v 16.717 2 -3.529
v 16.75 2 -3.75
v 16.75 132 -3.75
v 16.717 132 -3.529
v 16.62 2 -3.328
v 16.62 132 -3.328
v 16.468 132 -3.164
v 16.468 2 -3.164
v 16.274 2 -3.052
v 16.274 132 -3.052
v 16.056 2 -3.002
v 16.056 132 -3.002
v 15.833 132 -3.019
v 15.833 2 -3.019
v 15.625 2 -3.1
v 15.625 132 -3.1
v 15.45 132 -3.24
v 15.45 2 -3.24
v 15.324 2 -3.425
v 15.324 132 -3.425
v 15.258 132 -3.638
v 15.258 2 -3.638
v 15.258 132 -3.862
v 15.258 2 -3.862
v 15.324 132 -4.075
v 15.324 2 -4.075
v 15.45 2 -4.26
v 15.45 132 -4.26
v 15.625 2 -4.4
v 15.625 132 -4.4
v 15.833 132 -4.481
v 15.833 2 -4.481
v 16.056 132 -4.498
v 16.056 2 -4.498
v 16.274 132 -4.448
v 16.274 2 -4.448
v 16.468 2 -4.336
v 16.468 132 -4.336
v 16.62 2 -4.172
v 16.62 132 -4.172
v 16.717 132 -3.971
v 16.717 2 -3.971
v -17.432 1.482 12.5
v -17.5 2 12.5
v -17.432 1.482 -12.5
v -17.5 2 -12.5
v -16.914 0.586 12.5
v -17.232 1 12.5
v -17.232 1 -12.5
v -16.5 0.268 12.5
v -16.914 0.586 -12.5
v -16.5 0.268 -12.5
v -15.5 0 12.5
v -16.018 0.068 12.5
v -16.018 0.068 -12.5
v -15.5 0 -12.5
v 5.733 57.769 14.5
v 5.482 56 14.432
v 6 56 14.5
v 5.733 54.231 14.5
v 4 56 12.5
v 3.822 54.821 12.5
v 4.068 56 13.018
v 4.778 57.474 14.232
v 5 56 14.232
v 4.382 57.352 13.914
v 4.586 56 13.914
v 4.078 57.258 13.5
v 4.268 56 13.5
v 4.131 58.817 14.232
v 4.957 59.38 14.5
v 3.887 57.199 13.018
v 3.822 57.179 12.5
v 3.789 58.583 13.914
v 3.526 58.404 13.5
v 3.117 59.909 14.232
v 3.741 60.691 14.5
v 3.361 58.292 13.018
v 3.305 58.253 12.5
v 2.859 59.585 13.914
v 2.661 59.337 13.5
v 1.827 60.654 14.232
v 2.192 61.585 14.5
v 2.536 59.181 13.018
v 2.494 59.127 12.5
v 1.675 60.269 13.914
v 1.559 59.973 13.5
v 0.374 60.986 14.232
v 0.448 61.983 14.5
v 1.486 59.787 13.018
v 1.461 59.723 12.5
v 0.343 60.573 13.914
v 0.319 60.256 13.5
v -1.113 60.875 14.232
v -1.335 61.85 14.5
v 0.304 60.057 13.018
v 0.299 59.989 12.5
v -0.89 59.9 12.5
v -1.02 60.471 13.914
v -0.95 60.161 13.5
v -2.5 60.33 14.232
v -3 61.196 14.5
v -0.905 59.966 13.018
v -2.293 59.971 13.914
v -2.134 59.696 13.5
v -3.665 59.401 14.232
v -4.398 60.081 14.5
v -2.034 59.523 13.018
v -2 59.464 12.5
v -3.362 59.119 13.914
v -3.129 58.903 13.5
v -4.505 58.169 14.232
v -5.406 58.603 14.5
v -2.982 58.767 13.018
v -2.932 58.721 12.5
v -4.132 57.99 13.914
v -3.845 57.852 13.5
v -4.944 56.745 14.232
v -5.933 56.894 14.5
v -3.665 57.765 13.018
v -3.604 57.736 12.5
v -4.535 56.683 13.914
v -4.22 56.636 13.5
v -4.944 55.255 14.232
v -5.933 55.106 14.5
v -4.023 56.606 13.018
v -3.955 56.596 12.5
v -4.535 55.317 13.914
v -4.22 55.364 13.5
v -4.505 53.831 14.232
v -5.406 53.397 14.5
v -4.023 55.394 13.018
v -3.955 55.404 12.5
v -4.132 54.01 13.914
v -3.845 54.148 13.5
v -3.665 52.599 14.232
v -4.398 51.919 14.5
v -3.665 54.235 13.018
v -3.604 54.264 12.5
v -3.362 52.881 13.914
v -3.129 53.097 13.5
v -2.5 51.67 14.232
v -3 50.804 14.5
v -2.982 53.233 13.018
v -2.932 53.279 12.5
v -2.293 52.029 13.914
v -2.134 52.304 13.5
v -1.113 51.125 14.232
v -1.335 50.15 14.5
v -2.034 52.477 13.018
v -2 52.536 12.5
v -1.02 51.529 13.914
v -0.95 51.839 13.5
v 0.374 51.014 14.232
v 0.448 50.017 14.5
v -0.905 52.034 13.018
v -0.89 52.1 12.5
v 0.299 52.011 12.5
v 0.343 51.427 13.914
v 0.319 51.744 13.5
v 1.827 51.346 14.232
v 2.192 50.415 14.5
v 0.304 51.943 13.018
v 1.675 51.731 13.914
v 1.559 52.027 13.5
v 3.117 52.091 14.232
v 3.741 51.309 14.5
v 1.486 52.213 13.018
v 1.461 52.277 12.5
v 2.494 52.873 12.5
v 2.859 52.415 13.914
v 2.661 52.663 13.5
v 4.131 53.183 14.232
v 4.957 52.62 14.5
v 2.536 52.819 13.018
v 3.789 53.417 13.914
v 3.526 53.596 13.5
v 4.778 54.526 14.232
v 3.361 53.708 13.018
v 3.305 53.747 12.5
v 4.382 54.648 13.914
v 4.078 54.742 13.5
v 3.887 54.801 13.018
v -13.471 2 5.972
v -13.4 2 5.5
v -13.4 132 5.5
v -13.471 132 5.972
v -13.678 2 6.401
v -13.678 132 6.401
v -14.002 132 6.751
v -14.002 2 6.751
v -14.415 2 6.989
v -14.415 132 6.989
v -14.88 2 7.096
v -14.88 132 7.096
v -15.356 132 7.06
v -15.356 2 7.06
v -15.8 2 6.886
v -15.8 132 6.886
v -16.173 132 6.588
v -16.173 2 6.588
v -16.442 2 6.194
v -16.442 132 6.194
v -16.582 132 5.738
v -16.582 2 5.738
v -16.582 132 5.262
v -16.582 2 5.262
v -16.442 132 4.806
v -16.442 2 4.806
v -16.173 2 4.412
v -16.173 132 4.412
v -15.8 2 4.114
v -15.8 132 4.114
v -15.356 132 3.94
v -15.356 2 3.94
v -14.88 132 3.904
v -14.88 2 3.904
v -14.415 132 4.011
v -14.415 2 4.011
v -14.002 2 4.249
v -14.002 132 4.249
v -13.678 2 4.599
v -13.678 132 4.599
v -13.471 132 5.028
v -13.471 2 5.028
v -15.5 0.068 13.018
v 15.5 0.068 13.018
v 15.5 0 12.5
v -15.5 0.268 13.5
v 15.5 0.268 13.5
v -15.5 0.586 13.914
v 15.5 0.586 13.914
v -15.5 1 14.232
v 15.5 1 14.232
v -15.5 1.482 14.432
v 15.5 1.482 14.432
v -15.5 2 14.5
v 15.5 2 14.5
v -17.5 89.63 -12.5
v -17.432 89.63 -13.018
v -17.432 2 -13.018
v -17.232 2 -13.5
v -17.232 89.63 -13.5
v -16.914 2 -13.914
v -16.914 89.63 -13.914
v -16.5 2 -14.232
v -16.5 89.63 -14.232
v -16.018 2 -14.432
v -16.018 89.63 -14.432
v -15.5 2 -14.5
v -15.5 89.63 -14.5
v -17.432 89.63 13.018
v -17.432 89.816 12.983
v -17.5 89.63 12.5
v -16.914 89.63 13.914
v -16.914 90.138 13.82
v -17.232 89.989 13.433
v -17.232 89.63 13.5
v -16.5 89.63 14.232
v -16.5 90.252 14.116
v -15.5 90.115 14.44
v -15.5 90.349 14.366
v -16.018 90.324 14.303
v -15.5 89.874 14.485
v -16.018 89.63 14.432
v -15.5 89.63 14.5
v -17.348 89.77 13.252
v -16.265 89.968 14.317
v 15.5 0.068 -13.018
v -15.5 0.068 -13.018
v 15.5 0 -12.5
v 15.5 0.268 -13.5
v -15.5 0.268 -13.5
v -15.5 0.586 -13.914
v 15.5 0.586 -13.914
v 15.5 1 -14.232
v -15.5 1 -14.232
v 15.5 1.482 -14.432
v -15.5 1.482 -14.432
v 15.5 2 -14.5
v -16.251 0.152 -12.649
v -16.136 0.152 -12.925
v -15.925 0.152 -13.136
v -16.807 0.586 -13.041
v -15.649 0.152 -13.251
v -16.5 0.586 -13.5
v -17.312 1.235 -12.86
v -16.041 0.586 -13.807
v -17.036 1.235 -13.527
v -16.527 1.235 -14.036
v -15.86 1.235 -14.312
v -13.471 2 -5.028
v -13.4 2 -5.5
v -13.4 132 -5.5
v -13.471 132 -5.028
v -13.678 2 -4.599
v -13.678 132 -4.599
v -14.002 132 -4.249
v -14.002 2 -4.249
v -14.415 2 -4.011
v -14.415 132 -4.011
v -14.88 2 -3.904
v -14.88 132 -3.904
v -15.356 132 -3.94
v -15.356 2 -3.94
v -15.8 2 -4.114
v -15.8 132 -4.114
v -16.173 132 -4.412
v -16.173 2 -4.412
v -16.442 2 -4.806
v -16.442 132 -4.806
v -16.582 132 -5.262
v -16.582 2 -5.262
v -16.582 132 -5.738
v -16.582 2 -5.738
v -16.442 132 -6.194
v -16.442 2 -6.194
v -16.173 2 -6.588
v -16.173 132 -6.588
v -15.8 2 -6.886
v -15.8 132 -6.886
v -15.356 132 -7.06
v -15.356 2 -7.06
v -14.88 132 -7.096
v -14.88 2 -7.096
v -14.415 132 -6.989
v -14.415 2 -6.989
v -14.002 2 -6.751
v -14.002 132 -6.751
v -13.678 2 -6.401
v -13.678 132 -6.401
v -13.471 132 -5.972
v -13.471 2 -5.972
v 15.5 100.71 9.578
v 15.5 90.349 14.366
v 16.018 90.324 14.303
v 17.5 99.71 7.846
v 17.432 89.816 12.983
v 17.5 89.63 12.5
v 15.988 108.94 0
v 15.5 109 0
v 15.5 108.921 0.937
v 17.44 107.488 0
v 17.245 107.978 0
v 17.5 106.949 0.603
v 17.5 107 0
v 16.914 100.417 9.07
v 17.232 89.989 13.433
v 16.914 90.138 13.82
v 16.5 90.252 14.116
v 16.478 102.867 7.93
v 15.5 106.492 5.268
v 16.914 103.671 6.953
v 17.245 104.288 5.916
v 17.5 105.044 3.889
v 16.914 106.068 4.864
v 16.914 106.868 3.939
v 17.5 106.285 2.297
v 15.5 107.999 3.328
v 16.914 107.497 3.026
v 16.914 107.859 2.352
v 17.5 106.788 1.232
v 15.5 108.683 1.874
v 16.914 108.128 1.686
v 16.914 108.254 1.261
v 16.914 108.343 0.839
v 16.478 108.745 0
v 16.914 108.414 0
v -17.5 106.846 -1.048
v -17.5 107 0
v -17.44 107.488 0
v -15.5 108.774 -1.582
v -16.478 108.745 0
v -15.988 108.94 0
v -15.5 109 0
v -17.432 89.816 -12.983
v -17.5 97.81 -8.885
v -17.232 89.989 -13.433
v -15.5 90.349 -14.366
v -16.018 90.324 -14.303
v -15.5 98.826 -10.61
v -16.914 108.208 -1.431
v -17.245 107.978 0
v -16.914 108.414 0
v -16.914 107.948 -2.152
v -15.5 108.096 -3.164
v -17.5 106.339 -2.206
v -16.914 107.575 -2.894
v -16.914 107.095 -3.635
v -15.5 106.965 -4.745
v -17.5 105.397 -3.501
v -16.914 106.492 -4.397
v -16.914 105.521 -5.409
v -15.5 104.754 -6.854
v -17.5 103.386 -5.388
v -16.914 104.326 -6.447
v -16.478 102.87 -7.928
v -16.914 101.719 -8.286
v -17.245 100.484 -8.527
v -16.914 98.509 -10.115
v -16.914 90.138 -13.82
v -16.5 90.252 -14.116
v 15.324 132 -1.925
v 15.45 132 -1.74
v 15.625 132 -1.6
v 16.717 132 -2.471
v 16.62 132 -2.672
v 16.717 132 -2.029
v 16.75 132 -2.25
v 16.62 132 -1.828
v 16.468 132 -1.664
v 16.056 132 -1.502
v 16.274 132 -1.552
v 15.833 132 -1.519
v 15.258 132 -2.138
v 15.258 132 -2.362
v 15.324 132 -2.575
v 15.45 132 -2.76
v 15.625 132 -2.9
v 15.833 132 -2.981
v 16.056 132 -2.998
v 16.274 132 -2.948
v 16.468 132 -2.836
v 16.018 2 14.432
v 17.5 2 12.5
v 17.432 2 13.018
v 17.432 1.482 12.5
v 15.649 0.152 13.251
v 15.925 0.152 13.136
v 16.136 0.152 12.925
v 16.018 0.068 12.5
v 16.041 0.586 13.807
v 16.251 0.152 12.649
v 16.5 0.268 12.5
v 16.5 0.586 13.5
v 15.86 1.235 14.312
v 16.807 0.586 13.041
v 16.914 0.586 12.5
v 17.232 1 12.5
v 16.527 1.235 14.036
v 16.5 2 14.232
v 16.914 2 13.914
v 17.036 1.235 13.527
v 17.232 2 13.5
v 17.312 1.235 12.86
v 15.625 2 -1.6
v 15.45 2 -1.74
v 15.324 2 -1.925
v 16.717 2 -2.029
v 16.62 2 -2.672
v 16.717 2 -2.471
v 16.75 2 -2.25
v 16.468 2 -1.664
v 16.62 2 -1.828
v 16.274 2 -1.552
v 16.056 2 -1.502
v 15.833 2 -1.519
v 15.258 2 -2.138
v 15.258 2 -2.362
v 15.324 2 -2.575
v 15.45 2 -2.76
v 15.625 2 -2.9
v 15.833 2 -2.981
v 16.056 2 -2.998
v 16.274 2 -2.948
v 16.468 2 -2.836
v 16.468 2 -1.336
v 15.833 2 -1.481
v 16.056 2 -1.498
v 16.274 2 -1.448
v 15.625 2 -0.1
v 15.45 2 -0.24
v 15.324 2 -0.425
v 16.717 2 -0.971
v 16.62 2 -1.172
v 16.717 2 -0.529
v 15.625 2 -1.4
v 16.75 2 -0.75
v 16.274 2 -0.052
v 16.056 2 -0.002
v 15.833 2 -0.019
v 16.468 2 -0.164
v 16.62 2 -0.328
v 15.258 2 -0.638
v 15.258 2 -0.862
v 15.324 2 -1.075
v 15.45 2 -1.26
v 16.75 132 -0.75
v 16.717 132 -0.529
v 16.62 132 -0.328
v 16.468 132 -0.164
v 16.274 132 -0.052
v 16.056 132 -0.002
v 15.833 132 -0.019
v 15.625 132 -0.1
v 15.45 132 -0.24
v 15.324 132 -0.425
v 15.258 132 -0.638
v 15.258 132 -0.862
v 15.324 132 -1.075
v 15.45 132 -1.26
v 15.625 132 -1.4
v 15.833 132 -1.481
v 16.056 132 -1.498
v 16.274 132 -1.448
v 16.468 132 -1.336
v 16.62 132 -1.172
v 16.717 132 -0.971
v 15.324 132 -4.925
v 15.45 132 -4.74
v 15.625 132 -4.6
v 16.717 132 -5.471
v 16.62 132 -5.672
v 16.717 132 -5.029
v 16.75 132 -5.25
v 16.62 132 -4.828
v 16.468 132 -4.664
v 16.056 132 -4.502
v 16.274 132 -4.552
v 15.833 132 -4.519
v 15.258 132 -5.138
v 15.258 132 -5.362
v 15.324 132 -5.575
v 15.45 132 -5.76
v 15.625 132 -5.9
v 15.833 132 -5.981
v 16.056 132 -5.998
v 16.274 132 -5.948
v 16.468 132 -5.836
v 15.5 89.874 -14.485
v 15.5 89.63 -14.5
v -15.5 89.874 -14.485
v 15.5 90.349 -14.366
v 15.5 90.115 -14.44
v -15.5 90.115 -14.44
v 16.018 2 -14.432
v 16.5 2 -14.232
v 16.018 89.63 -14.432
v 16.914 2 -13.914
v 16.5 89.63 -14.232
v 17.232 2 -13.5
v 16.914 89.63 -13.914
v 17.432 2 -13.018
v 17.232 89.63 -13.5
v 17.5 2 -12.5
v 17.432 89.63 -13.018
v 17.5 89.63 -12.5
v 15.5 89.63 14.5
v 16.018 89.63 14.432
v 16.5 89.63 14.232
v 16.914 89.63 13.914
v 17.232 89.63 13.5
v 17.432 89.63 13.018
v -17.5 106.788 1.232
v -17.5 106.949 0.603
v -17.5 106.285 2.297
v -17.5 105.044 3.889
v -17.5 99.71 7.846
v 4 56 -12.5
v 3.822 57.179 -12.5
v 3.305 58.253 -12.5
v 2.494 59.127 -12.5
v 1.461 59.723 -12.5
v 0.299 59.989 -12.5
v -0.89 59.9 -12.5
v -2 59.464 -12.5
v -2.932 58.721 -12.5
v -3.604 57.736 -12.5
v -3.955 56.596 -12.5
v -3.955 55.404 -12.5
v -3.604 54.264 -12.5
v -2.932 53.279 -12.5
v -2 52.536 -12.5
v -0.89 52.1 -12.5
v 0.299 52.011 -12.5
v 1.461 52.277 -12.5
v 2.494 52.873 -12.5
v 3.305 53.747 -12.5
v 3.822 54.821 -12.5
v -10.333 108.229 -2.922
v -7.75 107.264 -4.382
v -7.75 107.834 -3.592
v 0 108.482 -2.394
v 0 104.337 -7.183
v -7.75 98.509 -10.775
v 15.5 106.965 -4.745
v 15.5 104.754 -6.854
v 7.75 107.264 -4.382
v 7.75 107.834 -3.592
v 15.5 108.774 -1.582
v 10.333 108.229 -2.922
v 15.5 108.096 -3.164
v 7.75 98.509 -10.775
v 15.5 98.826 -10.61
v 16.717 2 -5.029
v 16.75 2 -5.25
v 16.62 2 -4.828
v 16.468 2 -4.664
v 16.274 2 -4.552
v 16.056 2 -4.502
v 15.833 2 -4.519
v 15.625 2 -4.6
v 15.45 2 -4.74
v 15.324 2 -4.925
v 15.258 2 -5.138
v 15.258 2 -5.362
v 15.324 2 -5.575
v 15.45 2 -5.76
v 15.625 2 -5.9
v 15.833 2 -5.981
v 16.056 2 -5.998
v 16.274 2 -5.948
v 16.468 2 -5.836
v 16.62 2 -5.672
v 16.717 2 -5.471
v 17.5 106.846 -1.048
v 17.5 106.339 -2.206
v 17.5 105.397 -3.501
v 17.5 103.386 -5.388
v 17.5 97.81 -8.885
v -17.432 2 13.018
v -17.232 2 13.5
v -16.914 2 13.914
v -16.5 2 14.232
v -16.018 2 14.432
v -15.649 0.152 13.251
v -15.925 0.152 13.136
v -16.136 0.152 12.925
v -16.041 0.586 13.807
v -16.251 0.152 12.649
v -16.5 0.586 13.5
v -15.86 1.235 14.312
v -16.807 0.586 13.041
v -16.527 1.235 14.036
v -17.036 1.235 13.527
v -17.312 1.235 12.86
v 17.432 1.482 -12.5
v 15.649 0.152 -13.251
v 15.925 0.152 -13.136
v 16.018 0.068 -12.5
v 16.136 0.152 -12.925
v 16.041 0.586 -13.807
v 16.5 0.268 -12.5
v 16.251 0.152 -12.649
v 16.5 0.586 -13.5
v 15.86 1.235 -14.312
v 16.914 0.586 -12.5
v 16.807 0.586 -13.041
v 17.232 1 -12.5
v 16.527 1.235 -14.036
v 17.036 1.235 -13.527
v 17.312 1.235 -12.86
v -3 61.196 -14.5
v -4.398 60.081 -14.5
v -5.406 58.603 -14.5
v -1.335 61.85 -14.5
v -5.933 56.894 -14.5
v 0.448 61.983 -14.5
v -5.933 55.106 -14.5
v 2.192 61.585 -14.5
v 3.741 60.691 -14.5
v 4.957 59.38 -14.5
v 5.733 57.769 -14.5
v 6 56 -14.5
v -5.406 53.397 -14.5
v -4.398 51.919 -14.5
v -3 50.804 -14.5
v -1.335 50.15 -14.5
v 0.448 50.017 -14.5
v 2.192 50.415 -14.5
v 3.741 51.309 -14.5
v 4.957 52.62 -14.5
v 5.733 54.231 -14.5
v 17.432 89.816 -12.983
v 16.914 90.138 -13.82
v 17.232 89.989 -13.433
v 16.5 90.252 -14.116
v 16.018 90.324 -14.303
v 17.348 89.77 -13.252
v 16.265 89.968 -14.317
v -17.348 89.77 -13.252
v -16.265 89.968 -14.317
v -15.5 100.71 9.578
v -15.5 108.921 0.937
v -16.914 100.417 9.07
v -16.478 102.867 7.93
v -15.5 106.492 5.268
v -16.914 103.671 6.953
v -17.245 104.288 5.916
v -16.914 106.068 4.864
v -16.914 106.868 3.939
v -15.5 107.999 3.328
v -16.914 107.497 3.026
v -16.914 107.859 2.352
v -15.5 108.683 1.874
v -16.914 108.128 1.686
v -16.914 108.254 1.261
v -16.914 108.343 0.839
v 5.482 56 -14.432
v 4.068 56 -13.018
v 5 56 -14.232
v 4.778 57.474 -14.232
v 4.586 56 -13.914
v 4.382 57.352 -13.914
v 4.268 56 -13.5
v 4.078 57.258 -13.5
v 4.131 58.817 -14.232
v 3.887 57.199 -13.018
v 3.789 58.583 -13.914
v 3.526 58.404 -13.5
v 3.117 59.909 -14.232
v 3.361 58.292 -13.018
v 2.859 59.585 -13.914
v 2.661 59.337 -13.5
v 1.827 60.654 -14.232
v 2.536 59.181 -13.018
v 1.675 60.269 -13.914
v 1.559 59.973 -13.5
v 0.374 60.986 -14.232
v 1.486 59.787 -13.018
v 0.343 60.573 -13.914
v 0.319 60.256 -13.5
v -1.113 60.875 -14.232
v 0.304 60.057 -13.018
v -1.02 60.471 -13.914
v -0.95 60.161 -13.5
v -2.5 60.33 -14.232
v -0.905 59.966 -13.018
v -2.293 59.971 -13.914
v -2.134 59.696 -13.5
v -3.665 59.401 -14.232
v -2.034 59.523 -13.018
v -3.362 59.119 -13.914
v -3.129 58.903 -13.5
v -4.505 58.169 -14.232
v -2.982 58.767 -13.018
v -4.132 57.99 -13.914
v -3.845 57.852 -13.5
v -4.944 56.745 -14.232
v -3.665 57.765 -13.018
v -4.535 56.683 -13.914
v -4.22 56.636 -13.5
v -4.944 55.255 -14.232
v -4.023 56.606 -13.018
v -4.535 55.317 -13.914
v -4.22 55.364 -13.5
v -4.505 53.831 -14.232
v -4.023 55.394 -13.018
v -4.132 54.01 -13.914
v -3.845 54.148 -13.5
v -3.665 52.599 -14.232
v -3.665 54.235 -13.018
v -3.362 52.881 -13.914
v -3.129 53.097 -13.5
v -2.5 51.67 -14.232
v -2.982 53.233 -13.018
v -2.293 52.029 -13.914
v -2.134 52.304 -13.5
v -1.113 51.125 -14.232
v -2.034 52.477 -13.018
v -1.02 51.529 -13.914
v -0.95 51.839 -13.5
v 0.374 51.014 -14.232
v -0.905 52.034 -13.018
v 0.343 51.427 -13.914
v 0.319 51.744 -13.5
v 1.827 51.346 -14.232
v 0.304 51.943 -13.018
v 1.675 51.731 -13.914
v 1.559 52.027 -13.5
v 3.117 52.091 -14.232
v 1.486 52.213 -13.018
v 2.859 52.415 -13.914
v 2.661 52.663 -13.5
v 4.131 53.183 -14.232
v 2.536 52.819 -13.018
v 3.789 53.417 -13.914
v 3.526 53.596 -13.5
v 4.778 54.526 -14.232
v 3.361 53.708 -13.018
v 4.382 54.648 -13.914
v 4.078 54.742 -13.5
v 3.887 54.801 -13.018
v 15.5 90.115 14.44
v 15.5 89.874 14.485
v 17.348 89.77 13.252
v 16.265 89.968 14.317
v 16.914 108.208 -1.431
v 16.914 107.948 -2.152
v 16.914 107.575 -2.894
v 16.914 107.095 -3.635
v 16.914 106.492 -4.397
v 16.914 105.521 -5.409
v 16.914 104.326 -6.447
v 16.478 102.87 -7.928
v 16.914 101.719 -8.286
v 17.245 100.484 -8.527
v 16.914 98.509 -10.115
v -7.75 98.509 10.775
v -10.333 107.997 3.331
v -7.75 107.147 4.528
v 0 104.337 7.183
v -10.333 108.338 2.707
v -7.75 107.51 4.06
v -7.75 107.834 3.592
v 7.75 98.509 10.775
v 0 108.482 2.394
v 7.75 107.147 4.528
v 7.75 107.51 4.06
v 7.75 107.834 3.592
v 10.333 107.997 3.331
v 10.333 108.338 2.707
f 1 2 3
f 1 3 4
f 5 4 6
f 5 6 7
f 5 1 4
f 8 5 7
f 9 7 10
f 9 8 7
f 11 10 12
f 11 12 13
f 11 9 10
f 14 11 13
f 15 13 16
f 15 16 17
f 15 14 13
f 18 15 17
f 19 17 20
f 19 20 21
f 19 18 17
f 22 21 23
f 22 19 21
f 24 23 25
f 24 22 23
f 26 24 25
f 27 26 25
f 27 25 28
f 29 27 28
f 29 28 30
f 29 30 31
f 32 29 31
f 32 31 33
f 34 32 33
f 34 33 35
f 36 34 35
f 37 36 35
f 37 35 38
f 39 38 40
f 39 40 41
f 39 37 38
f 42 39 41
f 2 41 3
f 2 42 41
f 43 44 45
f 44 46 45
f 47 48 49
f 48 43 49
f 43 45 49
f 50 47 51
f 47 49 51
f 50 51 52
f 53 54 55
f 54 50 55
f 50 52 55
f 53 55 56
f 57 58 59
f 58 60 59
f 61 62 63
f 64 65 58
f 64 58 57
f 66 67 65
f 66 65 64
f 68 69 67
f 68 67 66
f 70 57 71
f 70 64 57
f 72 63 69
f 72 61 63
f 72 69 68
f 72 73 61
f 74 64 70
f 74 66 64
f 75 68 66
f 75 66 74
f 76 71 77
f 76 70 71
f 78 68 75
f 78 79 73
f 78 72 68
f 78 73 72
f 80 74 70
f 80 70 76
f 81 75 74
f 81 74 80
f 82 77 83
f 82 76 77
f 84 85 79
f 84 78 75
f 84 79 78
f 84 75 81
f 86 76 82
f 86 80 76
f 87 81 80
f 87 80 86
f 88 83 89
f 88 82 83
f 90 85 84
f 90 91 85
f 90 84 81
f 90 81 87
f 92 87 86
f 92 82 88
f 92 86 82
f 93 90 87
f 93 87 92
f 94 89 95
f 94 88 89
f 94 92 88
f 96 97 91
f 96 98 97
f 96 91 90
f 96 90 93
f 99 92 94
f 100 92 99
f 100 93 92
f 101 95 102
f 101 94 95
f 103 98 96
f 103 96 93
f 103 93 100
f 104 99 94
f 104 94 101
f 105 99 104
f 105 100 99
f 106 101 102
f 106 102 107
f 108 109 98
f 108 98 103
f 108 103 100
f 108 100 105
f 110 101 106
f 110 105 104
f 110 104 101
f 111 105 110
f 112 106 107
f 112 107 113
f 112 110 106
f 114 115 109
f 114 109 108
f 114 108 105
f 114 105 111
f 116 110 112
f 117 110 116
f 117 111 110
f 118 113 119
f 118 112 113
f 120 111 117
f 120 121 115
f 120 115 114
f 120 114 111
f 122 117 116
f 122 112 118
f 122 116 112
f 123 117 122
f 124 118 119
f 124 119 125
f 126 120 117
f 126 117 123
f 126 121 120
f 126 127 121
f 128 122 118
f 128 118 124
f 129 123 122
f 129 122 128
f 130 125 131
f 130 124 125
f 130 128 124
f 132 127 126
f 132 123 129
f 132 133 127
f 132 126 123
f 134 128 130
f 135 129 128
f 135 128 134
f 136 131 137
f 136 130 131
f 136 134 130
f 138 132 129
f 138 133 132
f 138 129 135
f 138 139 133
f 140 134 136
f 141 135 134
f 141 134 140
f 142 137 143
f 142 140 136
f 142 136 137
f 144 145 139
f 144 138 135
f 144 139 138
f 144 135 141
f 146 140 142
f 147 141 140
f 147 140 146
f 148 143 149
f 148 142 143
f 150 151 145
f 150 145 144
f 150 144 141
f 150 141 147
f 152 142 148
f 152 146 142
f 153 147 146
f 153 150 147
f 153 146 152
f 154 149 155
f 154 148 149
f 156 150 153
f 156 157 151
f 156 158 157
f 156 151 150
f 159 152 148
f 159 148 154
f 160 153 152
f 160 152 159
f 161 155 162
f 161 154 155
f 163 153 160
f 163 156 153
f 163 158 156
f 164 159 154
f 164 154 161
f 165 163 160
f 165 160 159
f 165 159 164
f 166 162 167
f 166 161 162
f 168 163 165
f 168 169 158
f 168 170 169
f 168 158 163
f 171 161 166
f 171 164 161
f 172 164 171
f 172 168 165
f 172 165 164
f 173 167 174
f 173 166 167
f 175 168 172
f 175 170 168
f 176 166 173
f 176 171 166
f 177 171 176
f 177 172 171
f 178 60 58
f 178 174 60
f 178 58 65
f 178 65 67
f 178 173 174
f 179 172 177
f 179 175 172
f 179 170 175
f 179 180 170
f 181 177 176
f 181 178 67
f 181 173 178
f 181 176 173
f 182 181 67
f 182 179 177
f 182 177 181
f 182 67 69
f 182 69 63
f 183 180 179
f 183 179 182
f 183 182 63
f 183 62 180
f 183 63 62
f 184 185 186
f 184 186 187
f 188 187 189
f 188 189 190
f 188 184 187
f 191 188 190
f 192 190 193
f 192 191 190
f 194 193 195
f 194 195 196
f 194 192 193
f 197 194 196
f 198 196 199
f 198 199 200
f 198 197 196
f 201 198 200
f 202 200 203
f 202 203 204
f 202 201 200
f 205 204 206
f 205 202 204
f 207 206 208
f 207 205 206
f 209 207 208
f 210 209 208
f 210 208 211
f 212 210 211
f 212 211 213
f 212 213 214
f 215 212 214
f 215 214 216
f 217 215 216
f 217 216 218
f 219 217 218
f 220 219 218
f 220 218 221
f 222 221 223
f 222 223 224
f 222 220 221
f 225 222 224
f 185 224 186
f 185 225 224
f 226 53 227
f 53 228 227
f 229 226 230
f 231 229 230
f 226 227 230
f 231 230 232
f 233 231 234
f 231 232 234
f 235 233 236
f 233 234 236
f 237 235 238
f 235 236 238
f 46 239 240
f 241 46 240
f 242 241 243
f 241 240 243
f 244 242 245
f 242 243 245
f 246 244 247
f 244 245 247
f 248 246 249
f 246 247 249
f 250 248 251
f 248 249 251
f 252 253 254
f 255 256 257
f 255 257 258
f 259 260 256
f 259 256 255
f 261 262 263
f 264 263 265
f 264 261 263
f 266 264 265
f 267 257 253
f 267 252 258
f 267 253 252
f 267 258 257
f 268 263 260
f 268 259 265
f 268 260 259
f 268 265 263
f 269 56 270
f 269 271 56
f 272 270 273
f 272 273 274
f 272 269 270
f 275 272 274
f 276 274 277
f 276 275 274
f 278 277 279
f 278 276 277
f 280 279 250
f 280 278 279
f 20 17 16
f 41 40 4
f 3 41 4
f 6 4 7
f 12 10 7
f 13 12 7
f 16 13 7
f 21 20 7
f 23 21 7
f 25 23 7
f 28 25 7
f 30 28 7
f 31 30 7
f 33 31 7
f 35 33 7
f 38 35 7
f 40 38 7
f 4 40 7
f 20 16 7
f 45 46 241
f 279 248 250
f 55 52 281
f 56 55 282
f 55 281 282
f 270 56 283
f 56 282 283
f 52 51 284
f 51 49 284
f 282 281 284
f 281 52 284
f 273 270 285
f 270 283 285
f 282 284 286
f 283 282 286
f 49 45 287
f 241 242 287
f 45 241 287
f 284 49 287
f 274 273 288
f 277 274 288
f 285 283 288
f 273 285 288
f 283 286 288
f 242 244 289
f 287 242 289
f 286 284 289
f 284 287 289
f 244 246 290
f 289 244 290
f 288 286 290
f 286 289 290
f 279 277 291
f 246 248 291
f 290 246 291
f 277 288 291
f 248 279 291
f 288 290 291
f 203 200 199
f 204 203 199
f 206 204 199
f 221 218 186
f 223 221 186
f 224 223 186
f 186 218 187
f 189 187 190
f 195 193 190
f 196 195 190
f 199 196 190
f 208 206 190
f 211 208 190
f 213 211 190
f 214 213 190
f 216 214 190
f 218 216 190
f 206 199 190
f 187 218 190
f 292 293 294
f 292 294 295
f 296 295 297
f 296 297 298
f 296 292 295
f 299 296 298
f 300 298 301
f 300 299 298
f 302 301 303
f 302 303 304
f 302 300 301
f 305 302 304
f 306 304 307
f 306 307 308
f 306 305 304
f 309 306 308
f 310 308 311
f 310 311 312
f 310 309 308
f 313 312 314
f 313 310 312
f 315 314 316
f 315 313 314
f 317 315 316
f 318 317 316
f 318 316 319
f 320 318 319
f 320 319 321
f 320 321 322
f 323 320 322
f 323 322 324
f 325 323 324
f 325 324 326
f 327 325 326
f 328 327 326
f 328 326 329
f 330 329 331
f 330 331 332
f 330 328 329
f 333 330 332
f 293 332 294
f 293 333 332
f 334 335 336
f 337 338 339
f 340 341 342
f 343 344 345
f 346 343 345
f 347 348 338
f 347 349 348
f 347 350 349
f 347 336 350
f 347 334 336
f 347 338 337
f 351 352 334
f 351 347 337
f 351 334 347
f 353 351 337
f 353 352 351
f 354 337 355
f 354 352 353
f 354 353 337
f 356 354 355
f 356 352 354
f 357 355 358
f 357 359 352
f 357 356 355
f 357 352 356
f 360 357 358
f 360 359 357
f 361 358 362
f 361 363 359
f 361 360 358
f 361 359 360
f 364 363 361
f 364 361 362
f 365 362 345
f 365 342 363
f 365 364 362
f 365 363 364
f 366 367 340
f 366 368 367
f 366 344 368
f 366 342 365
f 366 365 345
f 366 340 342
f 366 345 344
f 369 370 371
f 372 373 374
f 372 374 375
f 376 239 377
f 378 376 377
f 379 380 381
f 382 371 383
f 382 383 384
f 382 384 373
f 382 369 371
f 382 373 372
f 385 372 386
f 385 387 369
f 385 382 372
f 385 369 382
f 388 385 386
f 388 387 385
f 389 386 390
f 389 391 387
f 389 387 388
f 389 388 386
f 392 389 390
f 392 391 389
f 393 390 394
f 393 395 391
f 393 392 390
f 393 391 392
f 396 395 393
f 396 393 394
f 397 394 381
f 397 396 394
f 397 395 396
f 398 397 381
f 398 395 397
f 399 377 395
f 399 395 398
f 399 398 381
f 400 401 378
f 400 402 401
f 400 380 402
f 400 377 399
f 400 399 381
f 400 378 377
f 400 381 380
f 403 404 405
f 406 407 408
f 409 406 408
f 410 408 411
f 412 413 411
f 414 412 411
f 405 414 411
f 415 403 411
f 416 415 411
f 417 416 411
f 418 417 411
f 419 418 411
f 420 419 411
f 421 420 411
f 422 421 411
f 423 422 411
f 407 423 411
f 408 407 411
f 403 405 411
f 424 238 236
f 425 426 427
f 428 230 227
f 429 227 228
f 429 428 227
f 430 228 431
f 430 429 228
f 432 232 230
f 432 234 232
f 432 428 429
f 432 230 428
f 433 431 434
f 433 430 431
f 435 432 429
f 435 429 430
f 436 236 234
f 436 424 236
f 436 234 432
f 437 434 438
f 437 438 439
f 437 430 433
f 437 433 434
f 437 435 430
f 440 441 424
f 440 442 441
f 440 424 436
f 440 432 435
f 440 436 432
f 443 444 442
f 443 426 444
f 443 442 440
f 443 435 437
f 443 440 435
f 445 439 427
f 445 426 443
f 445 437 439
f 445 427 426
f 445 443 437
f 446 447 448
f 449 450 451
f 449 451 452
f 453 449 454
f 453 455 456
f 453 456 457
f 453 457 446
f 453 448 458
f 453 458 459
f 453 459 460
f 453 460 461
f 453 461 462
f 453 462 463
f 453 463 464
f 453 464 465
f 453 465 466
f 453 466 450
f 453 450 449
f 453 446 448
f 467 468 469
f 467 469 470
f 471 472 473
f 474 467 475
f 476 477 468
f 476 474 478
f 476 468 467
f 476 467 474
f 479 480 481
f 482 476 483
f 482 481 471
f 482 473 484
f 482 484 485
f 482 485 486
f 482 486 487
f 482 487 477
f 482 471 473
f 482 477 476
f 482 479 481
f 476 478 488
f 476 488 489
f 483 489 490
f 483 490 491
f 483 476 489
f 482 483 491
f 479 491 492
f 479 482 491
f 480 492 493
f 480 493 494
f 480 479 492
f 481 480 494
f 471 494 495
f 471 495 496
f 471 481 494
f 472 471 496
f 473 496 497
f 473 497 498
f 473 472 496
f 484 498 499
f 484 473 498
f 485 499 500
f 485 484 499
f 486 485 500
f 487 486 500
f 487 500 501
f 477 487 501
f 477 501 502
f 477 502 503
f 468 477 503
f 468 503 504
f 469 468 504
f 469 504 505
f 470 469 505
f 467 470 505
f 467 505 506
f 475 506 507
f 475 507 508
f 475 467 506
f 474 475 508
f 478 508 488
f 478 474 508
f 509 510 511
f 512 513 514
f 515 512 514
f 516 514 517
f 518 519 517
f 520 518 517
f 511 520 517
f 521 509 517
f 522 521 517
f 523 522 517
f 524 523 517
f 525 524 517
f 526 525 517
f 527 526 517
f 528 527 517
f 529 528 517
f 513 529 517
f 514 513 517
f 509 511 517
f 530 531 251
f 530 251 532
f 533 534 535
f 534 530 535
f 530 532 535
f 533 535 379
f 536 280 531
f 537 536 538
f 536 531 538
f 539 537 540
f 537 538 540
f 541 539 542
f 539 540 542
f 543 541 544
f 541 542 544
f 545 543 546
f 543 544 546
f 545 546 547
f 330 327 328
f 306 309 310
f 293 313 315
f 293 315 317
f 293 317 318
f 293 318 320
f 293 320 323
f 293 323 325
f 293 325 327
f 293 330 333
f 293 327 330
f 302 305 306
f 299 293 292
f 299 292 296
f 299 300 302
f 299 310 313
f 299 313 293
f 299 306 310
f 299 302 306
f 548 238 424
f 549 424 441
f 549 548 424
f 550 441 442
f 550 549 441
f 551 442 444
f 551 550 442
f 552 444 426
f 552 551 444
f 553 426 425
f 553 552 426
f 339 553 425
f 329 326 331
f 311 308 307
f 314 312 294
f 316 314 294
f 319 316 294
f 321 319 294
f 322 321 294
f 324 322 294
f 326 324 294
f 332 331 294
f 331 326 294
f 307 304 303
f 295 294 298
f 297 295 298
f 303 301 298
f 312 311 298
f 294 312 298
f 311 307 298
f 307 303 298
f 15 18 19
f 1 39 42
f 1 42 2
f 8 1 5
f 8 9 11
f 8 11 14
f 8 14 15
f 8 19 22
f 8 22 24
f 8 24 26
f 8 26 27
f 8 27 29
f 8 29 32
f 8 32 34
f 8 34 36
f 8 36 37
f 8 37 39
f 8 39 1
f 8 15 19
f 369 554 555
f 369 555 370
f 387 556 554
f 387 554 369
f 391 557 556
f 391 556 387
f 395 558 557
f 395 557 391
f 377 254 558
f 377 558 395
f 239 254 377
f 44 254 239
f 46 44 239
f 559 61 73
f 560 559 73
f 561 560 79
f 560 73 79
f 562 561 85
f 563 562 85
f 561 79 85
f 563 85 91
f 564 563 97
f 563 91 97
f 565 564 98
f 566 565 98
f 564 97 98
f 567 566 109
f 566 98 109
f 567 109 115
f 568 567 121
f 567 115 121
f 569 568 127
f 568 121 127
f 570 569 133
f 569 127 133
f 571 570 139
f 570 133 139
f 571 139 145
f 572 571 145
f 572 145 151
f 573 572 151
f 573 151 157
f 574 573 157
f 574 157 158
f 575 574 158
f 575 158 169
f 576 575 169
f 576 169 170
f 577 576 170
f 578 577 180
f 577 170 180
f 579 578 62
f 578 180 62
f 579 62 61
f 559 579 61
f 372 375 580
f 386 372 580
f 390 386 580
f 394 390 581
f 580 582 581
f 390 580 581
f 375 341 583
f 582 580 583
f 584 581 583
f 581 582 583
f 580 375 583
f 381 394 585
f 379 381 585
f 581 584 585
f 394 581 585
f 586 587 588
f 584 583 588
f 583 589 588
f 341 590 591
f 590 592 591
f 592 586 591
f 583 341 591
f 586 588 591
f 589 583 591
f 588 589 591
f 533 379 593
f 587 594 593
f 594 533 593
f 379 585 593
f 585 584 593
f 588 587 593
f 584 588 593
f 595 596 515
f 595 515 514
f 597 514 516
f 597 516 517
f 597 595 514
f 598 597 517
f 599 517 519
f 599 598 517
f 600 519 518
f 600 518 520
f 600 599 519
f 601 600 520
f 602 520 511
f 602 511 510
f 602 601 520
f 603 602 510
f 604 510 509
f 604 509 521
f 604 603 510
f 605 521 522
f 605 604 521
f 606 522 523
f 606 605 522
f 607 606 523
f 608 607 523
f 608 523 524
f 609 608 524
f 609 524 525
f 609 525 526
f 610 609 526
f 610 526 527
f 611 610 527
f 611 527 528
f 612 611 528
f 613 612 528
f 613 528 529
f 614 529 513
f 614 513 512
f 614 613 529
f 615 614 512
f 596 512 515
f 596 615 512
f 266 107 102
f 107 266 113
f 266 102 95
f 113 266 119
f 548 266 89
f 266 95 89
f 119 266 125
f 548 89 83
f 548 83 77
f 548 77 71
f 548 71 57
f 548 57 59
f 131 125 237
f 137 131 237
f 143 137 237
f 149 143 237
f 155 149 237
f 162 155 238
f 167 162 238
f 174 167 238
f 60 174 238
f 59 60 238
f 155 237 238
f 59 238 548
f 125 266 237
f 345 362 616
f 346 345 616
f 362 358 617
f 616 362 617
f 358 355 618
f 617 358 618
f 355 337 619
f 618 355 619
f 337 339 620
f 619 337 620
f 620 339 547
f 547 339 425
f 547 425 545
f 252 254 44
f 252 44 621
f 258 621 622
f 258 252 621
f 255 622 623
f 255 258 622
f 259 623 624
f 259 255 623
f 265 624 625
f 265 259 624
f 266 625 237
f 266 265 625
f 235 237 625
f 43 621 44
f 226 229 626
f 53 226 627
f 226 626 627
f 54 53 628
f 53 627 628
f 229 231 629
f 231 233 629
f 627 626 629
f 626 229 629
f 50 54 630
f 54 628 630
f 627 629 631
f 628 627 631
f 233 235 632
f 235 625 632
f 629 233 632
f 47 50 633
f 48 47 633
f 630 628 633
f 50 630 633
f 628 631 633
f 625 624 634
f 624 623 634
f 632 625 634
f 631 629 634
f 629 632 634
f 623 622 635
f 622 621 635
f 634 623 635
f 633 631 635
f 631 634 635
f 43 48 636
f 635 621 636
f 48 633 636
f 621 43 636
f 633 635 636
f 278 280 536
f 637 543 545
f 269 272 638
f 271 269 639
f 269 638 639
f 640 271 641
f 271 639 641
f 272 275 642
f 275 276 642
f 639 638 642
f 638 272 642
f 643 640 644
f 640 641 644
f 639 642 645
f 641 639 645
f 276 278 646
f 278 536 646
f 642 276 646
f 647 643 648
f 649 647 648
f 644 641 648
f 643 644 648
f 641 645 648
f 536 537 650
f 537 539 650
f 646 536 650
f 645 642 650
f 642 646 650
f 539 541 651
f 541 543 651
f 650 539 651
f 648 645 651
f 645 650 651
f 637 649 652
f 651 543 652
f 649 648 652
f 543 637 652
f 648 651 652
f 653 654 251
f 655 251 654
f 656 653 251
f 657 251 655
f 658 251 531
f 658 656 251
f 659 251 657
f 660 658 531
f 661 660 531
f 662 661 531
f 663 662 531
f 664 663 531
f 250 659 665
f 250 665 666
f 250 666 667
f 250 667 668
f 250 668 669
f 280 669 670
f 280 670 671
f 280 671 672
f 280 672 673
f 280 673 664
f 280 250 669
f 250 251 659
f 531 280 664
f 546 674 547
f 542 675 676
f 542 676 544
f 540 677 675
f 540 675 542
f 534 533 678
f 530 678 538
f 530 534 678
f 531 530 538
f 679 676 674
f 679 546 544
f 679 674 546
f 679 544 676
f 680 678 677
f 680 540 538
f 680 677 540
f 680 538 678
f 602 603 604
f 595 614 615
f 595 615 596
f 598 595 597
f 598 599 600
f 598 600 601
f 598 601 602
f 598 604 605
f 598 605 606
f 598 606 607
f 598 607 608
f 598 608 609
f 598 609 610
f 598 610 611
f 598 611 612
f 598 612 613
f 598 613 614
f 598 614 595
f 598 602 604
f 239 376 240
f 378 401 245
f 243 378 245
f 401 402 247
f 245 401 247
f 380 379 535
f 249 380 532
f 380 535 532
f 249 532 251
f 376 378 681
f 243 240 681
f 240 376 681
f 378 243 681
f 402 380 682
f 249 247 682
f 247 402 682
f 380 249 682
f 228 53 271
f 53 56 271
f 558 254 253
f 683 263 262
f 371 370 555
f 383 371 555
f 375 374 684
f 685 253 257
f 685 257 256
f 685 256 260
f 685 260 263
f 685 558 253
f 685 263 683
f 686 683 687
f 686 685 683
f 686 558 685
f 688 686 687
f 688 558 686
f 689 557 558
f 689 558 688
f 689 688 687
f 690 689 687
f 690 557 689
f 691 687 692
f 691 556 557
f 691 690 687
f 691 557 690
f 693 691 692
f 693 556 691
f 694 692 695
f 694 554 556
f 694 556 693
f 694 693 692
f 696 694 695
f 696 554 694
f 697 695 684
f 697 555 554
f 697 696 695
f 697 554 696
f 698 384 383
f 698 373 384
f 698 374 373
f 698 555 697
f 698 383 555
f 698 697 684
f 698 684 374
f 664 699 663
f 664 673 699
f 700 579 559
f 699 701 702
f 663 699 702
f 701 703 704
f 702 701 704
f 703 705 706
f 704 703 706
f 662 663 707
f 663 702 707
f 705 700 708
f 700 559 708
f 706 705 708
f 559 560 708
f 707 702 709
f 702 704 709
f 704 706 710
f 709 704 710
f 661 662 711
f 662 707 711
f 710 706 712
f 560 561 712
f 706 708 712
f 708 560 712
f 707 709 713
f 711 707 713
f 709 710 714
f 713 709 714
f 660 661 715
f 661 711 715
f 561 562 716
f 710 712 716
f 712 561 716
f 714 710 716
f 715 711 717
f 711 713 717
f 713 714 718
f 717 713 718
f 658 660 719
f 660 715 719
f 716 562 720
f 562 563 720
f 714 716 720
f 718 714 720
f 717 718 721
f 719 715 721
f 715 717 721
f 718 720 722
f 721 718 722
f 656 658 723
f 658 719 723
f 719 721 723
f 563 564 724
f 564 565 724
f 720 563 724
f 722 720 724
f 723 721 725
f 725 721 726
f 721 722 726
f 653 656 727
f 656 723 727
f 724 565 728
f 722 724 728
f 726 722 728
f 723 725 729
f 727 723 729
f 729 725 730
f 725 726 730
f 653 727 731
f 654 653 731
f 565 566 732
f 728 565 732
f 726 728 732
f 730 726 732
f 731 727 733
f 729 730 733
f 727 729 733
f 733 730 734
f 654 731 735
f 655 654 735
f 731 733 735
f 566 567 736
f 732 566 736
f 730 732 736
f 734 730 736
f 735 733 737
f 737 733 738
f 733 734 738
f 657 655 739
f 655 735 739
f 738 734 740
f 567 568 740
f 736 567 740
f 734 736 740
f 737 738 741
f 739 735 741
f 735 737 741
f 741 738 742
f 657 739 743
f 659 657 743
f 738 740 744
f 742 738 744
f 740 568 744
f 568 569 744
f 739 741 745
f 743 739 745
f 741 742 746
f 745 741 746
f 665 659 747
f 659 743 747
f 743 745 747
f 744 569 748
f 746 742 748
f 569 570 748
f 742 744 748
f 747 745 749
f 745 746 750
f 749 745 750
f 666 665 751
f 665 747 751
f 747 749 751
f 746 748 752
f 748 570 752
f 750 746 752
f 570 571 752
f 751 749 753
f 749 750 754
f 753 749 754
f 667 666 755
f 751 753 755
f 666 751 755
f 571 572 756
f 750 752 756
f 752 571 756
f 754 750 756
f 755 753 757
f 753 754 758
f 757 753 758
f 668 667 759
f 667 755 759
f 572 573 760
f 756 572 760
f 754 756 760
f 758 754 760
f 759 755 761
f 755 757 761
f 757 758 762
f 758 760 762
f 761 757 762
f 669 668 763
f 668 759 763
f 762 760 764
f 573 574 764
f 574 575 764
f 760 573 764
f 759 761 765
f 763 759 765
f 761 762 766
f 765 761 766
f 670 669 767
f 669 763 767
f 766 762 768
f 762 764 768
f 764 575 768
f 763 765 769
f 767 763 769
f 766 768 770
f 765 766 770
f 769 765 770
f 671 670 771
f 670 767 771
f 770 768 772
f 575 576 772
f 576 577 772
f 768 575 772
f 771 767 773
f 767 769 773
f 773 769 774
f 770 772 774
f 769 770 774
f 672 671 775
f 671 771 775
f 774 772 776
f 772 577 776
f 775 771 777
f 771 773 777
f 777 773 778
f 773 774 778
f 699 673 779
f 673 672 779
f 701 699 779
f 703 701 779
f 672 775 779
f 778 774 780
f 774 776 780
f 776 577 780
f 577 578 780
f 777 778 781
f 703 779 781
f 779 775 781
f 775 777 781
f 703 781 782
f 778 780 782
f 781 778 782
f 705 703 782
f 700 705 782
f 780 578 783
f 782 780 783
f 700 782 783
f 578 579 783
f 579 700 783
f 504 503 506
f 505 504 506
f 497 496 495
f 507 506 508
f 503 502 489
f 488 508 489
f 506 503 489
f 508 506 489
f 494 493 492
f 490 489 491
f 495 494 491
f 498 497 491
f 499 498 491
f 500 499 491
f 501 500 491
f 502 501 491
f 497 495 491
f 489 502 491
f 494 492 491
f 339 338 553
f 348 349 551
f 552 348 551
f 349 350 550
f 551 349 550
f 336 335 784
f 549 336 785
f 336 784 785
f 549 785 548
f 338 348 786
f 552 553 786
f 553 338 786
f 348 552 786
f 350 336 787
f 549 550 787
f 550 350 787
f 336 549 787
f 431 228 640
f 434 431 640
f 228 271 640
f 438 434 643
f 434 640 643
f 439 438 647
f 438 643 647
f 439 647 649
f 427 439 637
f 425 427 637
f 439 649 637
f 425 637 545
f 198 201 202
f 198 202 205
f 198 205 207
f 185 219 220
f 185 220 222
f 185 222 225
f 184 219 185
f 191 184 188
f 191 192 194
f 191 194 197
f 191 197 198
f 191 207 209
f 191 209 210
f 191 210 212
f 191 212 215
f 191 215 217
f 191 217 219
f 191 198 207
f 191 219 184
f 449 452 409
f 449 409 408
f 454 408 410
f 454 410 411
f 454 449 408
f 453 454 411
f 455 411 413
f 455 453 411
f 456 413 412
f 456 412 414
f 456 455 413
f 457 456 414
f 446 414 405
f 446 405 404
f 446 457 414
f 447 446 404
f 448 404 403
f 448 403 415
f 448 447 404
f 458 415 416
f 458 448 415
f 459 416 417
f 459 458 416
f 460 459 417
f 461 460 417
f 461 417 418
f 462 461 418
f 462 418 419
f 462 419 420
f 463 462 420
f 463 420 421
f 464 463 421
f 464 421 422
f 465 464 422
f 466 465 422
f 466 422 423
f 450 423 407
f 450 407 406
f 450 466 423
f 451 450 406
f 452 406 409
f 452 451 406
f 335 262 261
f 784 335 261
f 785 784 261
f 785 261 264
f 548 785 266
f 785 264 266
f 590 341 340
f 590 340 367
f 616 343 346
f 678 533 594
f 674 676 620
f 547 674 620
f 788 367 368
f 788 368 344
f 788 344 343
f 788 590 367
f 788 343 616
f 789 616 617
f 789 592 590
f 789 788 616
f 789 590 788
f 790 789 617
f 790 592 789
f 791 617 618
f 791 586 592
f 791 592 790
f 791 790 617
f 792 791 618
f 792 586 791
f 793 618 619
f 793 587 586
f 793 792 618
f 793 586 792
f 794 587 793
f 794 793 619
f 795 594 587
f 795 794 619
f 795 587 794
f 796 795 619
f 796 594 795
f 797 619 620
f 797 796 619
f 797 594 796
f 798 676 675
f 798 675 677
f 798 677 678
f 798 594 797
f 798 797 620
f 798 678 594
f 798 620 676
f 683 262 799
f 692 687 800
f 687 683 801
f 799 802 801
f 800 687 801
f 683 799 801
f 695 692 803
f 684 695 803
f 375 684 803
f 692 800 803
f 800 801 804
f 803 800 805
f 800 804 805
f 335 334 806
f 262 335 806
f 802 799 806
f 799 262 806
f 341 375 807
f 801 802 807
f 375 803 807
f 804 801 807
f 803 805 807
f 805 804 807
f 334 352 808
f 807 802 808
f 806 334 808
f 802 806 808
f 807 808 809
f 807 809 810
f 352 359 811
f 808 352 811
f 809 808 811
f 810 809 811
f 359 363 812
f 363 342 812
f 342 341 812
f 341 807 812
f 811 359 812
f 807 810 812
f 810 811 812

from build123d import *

# Parameters (mm, degrees)
SKETCH2_W             = 35
SKETCH2_H             = 29
BOSS_EXTRUDE1_DEPTH   = 109
CUT_EXTRUDE1_DEPTH    = 35
BOSS_EXTRUDE3_START   = -2
SKETCH4_R             = 1.6
BOSS_EXTRUDE3_DEPTH   = 130
BOSS_EXTRUDE3_2_DEPTH = 130
SKETCH4_R_2           = 0.75
BOSS_EXTRUDE3_3_DEPTH = 130
BOSS_EXTRUDE3_4_DEPTH = 130
BOSS_EXTRUDE3_5_DEPTH = 130
BOSS_EXTRUDE3_6_DEPTH = 130
FILLET1_R             = 2
SKETCH5_R             = 4
CUT_EXTRUDE2_DEPTH    = 29
FILLET2_R             = 2


with BuildPart() as part:
    # Sketch2 → Boss-Extrude1 (new body)
    with BuildSketch(Plane(origin=(0, 0, 0), x_dir=(1, 0, 0), z_dir=(0, 1, 0))):
        Rectangle(SKETCH2_W, SKETCH2_H)
    extrude(amount=BOSS_EXTRUDE1_DEPTH)

    # Sketch3 → Cut-Extrude1 (cut)
    with BuildSketch(Plane(origin=(17.5, 0, 0), x_dir=(0, 0, -1), z_dir=(1, 0, 0))):
        with BuildLine():
            add(Edge.make_bspline(
                [(0, 109), (7.25, 109), (14.5, 90)],
                knots=[0.5, 0.5, 0.5, 1, 1, 1], degree=2))
            Line((14.5, 90), (14.5, 109))
            Line((14.5, 109), (0, 109))
        make_face()
        with BuildLine():
            Line((-14.5, 109), (-14.5, 90))
            add(Edge.make_bspline(
                [(-14.5, 90), (-7.25, 109), (0, 109)],
                knots=[0, 0, 0, 0.5, 0.5, 0.5], degree=2))
            Line((0, 109), (-14.5, 109))
        make_face()
    extrude(amount=-CUT_EXTRUDE1_DEPTH, mode=Mode.SUBTRACT)

    # Fillet1
    fillet1_edges = [part.edges().sort_by_distance(p)[0] for p in [
        (-17.5, 45, -14.5),
        (17.5, 45, -14.5),
        (0, 90, -14.5),
        (17.5, 101.320451781, 9.218474052),
        (-17.5, 101.320451781, 9.218474052),
        (17.5, 45, 14.5),
        (-17.5, 45, 14.5),
        (0, 90, 14.5),
        (0, 0, 14.5),
        (-17.5, 0, 0),
        (0, 0, -14.5),
        (17.5, 0, 0),
    ]]
    fillet(fillet1_edges, radius=FILLET1_R)

    # Sketch5 → Cut-Extrude2 (cut)
    with BuildSketch(Plane.XY.offset(14.5)):
        with Locations((0, 56)):
            Circle(SKETCH5_R)
    extrude(amount=-CUT_EXTRUDE2_DEPTH, mode=Mode.SUBTRACT)

    # Fillet2
    fillet2_edges = [part.edges().sort_by_distance(p)[0] for p in [
        (-4, 56, 14.5),
        (-4, 56, -14.5),
    ]]
    fillet(fillet2_edges, radius=FILLET2_R)


with BuildPart() as body_2:
    # Sketch4 → Boss-Extrude3 (new body)
    with BuildSketch(Plane.XZ.offset(BOSS_EXTRUDE3_START)):
        with Locations((-15, -5.5)):
            Circle(SKETCH4_R)
    extrude(amount=-BOSS_EXTRUDE3_DEPTH)


with BuildPart() as body_3:
    # Sketch4 → Boss-Extrude3 2 (new body)
    with BuildSketch(Plane.XZ.offset(BOSS_EXTRUDE3_START)):
        with Locations((-15, 5.5)):
            Circle(SKETCH4_R)
    extrude(amount=-BOSS_EXTRUDE3_2_DEPTH)


with BuildPart() as body_4:
    # Sketch4 → Boss-Extrude3 3 (new body)
    with BuildSketch(Plane.XZ.offset(BOSS_EXTRUDE3_START)):
        with Locations((16, -5.25)):
            Circle(SKETCH4_R_2)
    extrude(amount=-BOSS_EXTRUDE3_3_DEPTH)


with BuildPart() as body_5:
    # Sketch4 → Boss-Extrude3 4 (new body)
    with BuildSketch(Plane.XZ.offset(BOSS_EXTRUDE3_START)):
        with Locations((16, -3.75)):
            Circle(SKETCH4_R_2)
    extrude(amount=-BOSS_EXTRUDE3_4_DEPTH)


with BuildPart() as body_6:
    # Sketch4 → Boss-Extrude3 5 (new body)
    with BuildSketch(Plane.XZ.offset(BOSS_EXTRUDE3_START)):
        with Locations((16, -2.25)):
            Circle(SKETCH4_R_2)
    extrude(amount=-BOSS_EXTRUDE3_5_DEPTH)


with BuildPart() as body_7:
    # Sketch4 → Boss-Extrude3 6 (new body)
    with BuildSketch(Plane.XZ.offset(BOSS_EXTRUDE3_START)):
        with Locations((16, -0.75)):
            Circle(SKETCH4_R_2)
    extrude(amount=-BOSS_EXTRUDE3_6_DEPTH)


solid = Compound([part.part, body_2.part, body_3.part, body_4.part, body_5.part, body_6.part, body_7.part])
